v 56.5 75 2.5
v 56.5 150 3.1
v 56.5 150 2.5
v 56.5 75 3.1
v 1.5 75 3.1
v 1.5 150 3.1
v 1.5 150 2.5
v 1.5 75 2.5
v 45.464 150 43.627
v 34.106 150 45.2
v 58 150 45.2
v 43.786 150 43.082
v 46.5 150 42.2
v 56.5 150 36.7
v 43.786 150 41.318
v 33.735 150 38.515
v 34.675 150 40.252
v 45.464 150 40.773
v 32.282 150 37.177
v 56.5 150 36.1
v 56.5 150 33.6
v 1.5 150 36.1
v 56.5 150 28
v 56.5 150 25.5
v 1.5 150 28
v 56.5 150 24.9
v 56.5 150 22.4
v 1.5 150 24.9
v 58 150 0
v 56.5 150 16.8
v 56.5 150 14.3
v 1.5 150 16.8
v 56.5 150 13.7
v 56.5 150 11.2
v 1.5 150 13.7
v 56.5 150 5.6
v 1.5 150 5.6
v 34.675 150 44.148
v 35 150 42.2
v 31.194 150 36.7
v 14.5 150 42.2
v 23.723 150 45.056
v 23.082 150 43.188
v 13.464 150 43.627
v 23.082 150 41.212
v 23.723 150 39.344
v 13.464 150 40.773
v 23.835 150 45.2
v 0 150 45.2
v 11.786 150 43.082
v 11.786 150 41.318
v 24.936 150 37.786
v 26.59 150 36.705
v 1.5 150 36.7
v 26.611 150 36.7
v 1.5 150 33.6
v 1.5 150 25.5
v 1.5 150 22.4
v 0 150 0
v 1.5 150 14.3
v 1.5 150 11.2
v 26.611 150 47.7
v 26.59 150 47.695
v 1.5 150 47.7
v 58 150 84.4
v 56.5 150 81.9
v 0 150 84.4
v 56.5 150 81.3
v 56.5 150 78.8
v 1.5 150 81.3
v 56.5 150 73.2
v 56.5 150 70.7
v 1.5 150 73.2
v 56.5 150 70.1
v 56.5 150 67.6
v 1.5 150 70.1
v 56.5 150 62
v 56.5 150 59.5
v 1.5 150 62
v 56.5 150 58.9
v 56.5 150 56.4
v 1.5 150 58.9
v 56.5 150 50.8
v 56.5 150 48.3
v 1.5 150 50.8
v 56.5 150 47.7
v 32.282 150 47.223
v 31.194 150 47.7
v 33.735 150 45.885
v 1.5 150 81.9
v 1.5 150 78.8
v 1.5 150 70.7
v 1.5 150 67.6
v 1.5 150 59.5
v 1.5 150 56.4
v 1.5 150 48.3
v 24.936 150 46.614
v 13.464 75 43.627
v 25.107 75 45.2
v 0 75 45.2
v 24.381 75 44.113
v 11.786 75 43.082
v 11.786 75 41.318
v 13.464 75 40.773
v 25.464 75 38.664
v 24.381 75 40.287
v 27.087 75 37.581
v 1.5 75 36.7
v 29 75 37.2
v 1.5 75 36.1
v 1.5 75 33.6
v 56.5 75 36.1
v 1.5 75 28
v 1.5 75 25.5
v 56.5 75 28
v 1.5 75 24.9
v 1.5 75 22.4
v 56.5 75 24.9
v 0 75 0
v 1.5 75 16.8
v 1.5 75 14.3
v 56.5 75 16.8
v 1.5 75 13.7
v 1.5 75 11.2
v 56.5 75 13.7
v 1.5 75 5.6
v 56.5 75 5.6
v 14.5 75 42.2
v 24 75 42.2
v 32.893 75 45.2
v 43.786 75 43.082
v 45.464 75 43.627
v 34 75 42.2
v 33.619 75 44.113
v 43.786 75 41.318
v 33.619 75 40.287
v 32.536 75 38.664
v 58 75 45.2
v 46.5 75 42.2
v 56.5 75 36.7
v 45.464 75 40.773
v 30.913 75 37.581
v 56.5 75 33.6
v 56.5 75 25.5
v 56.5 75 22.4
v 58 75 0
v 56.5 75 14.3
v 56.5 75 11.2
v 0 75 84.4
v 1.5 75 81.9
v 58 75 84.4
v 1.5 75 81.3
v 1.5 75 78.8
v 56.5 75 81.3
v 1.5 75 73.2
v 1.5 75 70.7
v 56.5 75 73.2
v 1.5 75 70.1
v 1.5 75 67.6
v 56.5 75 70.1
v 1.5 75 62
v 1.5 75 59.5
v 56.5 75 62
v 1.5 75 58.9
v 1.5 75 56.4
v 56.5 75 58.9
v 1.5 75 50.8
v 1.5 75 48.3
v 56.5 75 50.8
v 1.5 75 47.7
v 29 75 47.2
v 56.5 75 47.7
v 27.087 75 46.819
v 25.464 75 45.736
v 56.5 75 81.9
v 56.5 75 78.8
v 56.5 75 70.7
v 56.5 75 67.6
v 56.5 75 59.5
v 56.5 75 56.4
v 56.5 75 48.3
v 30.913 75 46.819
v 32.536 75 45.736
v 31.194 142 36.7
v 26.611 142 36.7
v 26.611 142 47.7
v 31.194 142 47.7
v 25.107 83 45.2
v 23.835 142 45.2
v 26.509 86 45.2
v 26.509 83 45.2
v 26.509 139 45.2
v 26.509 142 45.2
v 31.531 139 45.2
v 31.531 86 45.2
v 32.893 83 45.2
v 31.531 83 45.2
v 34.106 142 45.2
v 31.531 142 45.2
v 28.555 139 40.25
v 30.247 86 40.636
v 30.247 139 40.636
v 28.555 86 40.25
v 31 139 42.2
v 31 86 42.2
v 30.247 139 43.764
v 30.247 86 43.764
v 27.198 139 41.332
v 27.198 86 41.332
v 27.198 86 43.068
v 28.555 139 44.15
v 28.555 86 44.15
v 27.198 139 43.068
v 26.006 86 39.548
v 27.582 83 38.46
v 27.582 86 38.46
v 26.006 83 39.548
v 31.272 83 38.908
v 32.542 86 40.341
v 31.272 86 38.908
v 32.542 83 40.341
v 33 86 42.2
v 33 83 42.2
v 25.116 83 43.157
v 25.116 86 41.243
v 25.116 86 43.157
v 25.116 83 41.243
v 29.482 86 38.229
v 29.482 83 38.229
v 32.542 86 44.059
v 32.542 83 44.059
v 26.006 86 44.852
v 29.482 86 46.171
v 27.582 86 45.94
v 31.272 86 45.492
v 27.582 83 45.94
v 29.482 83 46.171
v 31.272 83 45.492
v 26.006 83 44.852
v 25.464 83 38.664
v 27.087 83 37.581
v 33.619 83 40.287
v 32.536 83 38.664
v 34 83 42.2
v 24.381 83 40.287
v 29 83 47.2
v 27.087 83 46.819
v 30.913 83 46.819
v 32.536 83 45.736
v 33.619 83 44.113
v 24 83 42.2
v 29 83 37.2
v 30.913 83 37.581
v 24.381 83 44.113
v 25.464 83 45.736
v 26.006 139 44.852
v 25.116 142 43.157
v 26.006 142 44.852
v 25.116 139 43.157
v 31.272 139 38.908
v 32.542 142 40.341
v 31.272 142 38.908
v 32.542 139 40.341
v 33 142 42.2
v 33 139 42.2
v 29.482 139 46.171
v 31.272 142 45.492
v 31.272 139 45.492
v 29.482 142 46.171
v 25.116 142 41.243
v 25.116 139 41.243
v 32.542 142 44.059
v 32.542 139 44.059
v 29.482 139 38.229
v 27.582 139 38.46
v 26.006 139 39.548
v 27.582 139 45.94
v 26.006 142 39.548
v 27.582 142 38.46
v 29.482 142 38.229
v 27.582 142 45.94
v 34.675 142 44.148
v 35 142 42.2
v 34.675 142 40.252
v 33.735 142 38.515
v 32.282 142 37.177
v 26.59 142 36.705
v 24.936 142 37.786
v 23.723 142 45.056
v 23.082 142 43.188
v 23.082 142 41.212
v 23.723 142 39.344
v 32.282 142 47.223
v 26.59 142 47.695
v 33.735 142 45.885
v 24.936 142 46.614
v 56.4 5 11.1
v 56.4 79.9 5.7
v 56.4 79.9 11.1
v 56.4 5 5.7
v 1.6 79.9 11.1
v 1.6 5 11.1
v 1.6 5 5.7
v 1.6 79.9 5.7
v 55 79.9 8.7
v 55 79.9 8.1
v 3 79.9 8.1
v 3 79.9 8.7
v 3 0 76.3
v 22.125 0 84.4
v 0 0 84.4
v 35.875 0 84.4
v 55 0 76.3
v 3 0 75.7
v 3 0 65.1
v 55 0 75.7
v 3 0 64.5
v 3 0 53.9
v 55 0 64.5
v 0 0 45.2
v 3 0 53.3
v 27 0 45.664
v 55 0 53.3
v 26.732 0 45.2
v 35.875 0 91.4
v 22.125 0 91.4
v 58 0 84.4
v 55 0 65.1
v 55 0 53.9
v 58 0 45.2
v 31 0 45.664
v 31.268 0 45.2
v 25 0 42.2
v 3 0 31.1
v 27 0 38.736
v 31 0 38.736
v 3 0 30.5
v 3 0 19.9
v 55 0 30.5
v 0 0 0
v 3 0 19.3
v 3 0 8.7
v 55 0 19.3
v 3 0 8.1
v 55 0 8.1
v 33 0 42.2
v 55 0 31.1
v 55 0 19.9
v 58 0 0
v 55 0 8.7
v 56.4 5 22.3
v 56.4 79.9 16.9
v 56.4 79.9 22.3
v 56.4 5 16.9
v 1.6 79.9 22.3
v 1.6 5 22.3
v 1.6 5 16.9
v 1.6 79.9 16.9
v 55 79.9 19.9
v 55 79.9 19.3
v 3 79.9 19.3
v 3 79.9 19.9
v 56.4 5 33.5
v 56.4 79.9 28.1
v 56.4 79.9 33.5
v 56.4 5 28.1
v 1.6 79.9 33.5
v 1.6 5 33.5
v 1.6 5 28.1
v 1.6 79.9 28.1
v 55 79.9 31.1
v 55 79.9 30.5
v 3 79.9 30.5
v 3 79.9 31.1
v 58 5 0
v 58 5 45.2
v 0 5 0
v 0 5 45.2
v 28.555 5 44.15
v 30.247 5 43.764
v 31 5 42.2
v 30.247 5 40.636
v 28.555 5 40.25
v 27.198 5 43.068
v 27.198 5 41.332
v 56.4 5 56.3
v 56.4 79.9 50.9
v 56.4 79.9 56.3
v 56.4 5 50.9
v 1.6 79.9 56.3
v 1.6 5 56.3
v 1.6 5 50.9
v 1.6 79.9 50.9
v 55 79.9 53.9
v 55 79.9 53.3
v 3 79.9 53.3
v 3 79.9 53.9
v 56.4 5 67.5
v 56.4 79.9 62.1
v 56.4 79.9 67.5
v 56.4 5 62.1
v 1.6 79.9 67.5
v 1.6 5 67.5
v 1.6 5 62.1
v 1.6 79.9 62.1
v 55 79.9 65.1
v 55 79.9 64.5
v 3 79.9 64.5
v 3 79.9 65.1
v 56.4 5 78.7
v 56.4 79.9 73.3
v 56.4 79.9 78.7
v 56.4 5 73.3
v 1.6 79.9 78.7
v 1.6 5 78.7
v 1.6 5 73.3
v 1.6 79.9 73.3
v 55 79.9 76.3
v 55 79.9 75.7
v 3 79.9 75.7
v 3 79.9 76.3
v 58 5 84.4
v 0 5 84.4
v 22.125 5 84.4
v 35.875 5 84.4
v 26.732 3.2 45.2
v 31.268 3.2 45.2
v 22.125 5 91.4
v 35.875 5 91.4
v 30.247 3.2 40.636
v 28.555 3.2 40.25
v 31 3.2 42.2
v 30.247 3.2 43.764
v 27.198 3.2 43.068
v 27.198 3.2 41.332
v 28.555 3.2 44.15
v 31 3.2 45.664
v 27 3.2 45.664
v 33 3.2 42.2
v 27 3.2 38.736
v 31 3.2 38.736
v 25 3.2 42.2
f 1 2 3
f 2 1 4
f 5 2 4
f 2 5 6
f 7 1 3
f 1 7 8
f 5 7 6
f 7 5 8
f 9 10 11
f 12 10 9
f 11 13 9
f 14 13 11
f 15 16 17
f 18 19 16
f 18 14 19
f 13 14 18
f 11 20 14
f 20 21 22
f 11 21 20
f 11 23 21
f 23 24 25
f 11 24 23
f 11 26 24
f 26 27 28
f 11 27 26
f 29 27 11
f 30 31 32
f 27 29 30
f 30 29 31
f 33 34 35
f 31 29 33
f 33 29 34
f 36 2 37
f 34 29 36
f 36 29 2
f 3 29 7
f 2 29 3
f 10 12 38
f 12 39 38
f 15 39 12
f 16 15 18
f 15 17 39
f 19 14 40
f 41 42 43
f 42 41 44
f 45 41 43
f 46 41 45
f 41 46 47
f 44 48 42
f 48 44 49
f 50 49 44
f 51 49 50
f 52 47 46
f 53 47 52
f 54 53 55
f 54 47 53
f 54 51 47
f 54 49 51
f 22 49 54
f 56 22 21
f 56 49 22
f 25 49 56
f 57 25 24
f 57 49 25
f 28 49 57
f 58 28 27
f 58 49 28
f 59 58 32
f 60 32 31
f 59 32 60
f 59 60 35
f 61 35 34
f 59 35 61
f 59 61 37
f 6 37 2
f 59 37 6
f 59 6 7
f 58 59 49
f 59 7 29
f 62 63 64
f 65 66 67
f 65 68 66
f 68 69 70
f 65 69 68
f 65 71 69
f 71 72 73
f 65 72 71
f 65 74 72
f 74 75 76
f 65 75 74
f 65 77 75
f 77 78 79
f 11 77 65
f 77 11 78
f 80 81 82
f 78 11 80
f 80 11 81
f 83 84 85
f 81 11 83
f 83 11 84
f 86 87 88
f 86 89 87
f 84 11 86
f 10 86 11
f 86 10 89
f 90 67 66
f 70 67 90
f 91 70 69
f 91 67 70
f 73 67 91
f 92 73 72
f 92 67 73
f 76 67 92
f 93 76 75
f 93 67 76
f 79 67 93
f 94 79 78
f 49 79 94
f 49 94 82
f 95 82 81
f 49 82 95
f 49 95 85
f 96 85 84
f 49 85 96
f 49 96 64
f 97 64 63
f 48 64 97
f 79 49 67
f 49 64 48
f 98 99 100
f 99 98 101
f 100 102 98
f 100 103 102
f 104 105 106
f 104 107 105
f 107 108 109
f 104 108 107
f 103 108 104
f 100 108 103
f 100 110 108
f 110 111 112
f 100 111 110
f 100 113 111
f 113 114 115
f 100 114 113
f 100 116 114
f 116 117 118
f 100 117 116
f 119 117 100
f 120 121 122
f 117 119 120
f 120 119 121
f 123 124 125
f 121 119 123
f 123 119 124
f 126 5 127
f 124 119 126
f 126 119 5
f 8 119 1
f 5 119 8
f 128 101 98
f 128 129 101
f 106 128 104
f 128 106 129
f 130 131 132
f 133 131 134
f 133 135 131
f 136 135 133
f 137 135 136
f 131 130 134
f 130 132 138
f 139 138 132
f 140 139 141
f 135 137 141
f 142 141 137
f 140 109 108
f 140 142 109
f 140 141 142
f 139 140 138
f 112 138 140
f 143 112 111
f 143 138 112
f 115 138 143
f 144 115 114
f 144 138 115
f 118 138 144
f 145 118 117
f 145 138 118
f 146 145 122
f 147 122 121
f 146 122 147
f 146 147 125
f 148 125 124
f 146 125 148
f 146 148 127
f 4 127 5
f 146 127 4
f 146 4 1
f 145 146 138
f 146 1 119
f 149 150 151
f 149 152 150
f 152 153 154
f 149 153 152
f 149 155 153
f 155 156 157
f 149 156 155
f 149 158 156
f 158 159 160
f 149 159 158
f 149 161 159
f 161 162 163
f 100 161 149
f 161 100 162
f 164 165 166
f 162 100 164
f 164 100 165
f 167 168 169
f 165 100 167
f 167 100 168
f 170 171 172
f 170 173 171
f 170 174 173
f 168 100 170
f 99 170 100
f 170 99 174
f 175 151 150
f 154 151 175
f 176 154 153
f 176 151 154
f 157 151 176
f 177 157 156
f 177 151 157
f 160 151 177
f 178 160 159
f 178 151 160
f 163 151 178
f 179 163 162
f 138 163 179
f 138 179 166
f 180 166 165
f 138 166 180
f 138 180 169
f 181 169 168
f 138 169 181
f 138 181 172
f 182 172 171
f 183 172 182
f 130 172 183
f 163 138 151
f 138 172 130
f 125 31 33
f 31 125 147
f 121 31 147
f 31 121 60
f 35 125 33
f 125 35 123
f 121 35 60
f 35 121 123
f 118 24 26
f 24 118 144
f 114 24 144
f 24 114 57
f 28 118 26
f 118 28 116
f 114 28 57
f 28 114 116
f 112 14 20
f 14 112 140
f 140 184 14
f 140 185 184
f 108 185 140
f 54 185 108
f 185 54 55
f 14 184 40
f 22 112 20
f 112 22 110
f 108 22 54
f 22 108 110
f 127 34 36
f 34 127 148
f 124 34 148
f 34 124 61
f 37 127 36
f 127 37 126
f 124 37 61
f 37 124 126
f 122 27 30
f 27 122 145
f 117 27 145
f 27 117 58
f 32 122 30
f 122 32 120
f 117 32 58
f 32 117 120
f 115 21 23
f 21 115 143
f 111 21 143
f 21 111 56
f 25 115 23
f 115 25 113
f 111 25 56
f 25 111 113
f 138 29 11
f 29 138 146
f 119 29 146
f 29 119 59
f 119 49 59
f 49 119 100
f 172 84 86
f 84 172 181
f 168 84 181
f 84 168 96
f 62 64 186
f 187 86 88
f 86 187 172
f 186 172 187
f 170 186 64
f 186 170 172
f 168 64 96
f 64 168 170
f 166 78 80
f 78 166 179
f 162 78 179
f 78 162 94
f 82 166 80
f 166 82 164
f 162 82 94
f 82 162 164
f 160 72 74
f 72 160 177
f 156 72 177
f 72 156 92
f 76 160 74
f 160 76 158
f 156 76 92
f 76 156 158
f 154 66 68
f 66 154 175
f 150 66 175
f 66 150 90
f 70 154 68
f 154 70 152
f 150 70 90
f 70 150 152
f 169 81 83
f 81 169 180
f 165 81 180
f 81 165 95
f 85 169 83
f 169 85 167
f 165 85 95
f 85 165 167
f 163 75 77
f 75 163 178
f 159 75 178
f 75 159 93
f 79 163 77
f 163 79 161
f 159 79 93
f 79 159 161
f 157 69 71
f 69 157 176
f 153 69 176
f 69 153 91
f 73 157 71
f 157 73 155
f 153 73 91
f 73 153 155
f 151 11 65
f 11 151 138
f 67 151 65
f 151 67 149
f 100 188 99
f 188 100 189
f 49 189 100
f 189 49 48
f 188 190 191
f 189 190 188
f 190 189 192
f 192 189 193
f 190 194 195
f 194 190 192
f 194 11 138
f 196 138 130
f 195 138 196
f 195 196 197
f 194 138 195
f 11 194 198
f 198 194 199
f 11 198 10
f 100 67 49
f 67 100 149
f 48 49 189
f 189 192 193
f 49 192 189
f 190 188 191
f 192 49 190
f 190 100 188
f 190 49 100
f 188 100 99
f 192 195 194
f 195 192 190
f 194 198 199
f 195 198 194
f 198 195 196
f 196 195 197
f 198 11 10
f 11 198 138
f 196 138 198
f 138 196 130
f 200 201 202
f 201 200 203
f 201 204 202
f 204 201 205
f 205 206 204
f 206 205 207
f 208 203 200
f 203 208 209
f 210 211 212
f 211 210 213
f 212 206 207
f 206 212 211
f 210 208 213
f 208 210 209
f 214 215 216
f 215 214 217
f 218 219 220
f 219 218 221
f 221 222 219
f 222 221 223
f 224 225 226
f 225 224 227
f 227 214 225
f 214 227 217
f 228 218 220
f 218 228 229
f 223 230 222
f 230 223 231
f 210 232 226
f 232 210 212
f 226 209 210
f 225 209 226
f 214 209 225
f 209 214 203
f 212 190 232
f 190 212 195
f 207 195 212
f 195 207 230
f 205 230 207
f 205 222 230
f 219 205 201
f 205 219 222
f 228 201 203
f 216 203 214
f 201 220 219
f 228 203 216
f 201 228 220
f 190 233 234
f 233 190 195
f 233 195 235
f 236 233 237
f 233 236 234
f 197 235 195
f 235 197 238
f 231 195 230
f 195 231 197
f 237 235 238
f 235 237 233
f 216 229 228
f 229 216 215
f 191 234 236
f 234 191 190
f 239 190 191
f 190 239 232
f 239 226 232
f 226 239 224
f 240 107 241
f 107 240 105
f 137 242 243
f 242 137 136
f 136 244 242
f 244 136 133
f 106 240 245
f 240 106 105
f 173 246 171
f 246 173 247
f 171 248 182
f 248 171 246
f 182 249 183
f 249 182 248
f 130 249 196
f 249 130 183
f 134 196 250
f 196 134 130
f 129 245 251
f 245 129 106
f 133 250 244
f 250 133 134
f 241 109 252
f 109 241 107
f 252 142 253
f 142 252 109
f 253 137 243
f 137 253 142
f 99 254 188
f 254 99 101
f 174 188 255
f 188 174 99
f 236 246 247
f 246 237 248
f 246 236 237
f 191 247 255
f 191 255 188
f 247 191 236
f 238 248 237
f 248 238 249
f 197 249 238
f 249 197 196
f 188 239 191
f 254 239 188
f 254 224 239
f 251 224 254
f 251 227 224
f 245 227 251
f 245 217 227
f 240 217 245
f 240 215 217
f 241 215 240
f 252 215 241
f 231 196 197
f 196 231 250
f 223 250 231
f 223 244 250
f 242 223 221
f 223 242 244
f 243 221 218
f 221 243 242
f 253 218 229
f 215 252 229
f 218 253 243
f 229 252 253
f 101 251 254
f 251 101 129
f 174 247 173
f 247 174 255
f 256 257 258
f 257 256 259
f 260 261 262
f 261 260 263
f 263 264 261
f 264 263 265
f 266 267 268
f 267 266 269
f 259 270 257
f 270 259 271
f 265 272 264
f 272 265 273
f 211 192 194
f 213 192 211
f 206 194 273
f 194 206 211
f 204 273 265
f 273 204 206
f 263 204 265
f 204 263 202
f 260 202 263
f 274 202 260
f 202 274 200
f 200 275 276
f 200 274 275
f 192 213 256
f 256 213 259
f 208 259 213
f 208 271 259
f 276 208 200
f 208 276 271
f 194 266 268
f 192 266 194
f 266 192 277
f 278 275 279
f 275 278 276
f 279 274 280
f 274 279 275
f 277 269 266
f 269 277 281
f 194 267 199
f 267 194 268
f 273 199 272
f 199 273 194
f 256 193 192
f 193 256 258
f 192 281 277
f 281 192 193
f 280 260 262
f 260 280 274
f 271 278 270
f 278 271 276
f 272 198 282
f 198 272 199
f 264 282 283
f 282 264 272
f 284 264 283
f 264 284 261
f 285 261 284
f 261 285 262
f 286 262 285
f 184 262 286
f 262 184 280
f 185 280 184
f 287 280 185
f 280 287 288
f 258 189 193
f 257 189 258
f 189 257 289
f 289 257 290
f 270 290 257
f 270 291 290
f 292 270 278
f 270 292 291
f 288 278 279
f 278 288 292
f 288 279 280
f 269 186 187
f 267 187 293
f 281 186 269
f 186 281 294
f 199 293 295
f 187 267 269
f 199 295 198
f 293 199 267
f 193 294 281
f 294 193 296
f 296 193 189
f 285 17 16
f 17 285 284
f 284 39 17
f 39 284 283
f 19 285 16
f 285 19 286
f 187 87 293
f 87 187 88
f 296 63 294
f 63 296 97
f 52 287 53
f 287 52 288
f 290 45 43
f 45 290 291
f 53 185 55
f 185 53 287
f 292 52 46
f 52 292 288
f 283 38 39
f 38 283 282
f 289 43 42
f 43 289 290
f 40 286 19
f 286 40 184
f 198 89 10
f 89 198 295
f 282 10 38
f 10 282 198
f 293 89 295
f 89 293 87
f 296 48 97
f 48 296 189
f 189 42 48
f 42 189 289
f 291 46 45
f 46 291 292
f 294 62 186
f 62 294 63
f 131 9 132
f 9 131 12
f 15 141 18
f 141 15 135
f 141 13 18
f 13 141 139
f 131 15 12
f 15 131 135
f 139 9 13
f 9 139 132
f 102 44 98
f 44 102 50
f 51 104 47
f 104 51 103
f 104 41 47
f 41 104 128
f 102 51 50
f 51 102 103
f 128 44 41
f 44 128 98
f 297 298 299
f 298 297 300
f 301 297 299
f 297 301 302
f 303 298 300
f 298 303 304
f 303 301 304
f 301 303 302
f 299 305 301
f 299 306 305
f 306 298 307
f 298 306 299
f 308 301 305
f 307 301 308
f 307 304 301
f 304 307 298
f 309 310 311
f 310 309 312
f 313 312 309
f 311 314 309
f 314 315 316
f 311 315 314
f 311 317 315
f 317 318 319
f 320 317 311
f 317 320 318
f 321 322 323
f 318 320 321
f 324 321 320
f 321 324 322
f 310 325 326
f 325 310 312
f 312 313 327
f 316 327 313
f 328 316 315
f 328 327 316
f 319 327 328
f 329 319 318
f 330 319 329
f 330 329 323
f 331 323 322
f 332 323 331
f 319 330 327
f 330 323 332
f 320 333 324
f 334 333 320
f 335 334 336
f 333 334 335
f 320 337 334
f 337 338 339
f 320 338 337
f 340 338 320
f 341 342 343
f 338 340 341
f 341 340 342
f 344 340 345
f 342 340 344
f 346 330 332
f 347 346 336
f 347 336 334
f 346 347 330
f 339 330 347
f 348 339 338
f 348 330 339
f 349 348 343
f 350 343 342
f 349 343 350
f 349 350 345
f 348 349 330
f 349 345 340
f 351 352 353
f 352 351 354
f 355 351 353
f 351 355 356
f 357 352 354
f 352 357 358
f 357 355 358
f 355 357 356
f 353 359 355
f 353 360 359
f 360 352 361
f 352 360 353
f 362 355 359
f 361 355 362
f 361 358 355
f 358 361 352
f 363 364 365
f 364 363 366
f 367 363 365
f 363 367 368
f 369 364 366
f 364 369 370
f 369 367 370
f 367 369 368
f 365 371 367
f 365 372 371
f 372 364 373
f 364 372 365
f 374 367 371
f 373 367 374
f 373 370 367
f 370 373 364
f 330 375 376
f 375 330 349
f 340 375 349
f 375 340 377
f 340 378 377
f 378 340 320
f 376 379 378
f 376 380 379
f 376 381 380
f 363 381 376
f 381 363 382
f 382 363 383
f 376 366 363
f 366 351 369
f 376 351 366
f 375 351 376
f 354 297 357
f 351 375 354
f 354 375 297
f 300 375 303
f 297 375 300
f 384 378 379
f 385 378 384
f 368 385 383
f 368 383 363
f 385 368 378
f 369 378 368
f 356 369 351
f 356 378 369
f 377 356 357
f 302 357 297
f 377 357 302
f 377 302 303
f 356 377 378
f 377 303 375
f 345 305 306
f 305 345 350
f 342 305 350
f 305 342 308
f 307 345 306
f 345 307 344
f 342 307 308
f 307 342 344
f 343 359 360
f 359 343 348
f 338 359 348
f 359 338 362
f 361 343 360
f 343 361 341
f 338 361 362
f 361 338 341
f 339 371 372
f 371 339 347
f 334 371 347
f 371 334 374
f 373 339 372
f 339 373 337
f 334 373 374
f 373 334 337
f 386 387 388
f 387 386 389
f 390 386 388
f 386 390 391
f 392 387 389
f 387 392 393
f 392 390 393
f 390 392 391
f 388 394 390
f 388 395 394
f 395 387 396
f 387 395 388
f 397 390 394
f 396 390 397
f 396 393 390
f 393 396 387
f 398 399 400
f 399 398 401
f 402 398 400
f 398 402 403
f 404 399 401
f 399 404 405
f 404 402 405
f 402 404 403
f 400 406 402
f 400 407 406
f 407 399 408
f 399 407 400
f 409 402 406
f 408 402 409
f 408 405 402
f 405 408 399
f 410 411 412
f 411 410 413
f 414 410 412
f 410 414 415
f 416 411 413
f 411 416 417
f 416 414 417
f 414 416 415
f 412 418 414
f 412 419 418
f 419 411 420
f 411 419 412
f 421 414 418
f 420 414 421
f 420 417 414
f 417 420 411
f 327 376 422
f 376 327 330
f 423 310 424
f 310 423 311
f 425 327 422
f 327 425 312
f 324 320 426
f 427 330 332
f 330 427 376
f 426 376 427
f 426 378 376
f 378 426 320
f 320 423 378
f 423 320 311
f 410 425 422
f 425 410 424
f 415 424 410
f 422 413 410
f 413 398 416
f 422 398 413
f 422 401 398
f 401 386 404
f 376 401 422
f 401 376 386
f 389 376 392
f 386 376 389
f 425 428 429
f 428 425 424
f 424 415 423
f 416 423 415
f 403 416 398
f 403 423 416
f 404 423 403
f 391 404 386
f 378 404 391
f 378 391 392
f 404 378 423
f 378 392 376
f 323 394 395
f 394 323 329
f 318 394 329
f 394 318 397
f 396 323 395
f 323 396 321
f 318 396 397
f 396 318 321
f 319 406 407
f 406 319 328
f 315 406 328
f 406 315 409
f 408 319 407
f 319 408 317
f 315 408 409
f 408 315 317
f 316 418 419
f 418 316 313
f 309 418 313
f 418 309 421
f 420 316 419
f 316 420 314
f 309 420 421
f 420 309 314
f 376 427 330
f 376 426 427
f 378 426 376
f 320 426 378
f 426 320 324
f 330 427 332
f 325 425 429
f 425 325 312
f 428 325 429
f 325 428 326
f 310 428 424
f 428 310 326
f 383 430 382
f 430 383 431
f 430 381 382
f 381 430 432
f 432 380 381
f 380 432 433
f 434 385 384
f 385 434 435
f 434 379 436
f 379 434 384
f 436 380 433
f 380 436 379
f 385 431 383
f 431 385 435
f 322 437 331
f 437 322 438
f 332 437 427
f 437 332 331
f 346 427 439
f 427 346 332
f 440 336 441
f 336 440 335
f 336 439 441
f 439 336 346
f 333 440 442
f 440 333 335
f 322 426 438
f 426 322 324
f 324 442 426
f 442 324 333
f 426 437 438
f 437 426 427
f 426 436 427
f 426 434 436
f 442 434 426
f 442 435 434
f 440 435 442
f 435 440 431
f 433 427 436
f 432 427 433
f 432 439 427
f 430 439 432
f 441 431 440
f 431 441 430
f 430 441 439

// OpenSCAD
/* [Main Parameters] */

// count of all plates in capacitor
plate_count_ = 13;           // [3, 5, 7, 9, 11, 13, 15, 17, 19, 21, 23, 25]

// distance between rotor and stator capacitor plates in mm
plate_distance_ = 5;         // [1, 2, 3, 4, 5, 6, 7, 8]

// capacitor plate width
plate_width_ = 55;

// capacitor plate height
plate_depth_ = 75;

// capacitor plate hole height, use larger value to make some room
plate_height_ = 0.6;

// gap between rotor and stator, tune for smoother sliding by printing tiny capacitor first, use acetone bath!
sliding_gap_ = 0.1;

// capacitor element to generate
generate_element_ = "stator";       // [stator, rotor]

// generate both stator and rotor for demo purposes?
generate_both_demo_ = "yes";        // [yes, no]

// enable worm gear system?
enable_worm_gear_ = "yes";          // [yes, no]

// enable button pusher?
enable_rotor_button_pusher_ = "yes";    // [yes, no]

/* [Worm Gear Parameters] */

// how much space to provide for worm gear system
worm_gear_gap_ = 6;

// worm shaft radius, change if use other than M4 shaft
worm_shaft_radius_ = 2;     // [1, 1.5, 2, 2.5, 3]

// bearing outer radius
bearing_radius_ = 4;

// bearing size depth/height
bearing_depth_ = 3;

// hole for screws, use larger diameter so tool will fit
screw_hole_radius_ = 6;

// depth of hole for screw, change based on shaft, number of nuts
screw_hole_depth_ = 8;

// hole sizes for stepper holder screws
holder_screw_radius_ = 1.5;

// distance from the shaft to the the motor holding screws
holder_screw_center_distance_ = 16;

// height of rotor button pusher    
button_pusher_height_ = 7;

// hole depth for holding nut on the rotor, change based on shaft, M3/M4/etc
nut_cutout_depth_ = 3.2;

// holding nut radius on the rotor, change based on shaft, M3/M4/etc
nut_cutout_radius_ = 4;
    
/* [Advanced Parameters] */

// gap between plate edge and stator edge
plate_width_guard_ = 1.5;

// depth of rotor base plate
rotor_base_plate_depth_ = 5;

assert(plate_count_ % 2 == 1, "Plate count must be an odd number");

echo("maximum capacitance: ~", capacitor_value_pf(plate_width_, plate_depth_, plate_count_, plate_distance_), "pF");
echo("breakdown voltage for air: ", breakdown_voltage_kv(3, plate_distance_), "kV");
echo("breakdown voltage for PETG: ", breakdown_voltage_kv(4.5, plate_distance_), "kV");

if (enable_worm_gear_ == "yes")
{
    assert(plate_count_ % 4 == 1, "Wrong plate count, must be one of [5, 9, 13, 17, 21, 25]");
    capacitor_with_worm_gear(plate_count_, plate_distance_, plate_width_, 
        plate_depth_, plate_height_, sliding_gap_, generate_element_, 
        generate_both_demo_, worm_gear_gap_, enable_rotor_button_pusher_);
} else 
{
    capacitor_naked(plate_count_, plate_distance_, plate_width_, 
        plate_depth_, plate_height_, sliding_gap_, generate_element_, generate_both_demo_);
}

// calculate capacitor breakdown voltage
function breakdown_voltage_kv(breakdown_voltage_mm, plate_distance) = plate_distance * breakdown_voltage_mm;

// calculate ~20% infill PETG filament approximate capacitor value from dimensions in mm and plate count
function capacitor_value_pf(plate_width, plate_depth, plate_count, plate_distance) =
    let (dielectric_constant = 1.55, electrostatic_constant = 8.854e-12)
        (plate_count - 1) * dielectric_constant * electrostatic_constant * plate_width * plate_depth / plate_distance * 1e9;

// generate capacitor with worm gear
module capacitor_with_worm_gear(plate_count, plate_distance, plate_width, 
    plate_depth, plate_height, sliding_gap, generate_element, generate_both_demo, 
    worm_gear_gap, enable_rotor_button_pusher)
{
    if (generate_element == "stator" || generate_both_demo == "yes") 
    {
        translate([0, 75, 0])
            capacitor_stator_with_worm_gear(plate_count, plate_distance, 
                plate_width, plate_depth, plate_height, worm_gear_gap);
    }
    if (generate_element == "rotor" || generate_both_demo == "yes") 
    {
        color("green")
            capacitor_rotor_with_worm_gear(plate_count, plate_distance, 
                plate_width, plate_depth, plate_height, sliding_gap, worm_gear_gap, enable_rotor_button_pusher);
    }
}

// generate capacitor
module capacitor_naked(plate_count, plate_distance, plate_width, 
    plate_depth, plate_height, sliding_gap, generate_element, generate_both_demo)
{
    if (generate_element == "stator" || generate_both_demo == "yes") 
    {
        translate([0, 50, 0])
            capacitor_stator(plate_count, plate_distance, 
                plate_width, plate_depth, plate_height);
    }
    if (generate_element == "rotor" || generate_both_demo == "yes") 
    {
        color("green")
            capacitor_rotor(plate_count, plate_distance, 
                plate_width, plate_depth, plate_height, sliding_gap);
    }
}

// generate stator with worm gear support
module capacitor_stator_with_worm_gear(plate_count, plate_distance, 
    plate_width, plate_depth, plate_height, worm_gear_gap)
{
    plate_width_guard = plate_width_guard_;
    worm_shaft_radius = worm_shaft_radius_;
    bearing_radius = bearing_radius_;
    bearing_depth = bearing_depth_;
    screw_hole_radius = screw_hole_radius_;
    screw_hole_depth = screw_hole_depth_;
    holder_screw_radius = holder_screw_radius_;
    holder_screw_center_distance = holder_screw_center_distance_;
    
    holder_screw_depth = plate_depth;
    bearing_full_depth = bearing_depth + screw_hole_depth;
    half_plate_count = ceil(plate_count / 2.0);
    box_height = half_plate_count * (plate_distance + plate_height);
    box_height_center = box_height + worm_gear_gap / 2.0;
    box_width_center = plate_width / 2.0 + plate_width_guard;
    
    difference()
    {
        // stator body with holes
        union()
        {
            // two split capacitor stators
            translate([0, 0, 0])
                capacitor_stator(half_plate_count, plate_distance, plate_width, plate_depth, plate_height);
            translate([0, 0, box_height + worm_gear_gap])
                capacitor_stator(half_plate_count, plate_distance, plate_width, plate_depth, plate_height);
            
            // worm gear blade hole
            translate([0, 0, box_height])
                cube([plate_width + 2 * plate_width_guard, plate_depth, worm_gear_gap]);
        }
        
        // worm gear system
        translate([plate_width / 2.0 + plate_width_guard, 0, box_height_center])
            rotate([-90, 0, 0])
                union() 
                {
                    cylinder(plate_depth, r=worm_shaft_radius);
                    cylinder(bearing_full_depth, r=bearing_radius);
                    cylinder(screw_hole_depth, r=bearing_radius + 1);
                }
        translate([box_width_center, plate_depth - bearing_full_depth, box_height_center])
            rotate([-90, 0, 0])
                cylinder(bearing_full_depth, r=bearing_radius);
        translate([box_width_center, plate_depth - screw_hole_depth, box_height_center])
            rotate([-90, 0, 0])
                cylinder(screw_hole_depth, r=screw_hole_radius);

        // holder holes
        translate([box_width_center + holder_screw_center_distance, plate_depth - holder_screw_depth, box_height_center])
            rotate([-90, 0, 0])
                cylinder(holder_screw_depth, r=holder_screw_radius);
        translate([box_width_center - holder_screw_center_distance, plate_depth - holder_screw_depth, box_height_center])
            rotate([-90, 0, 0])
                cylinder(holder_screw_depth, r=holder_screw_radius);
    }
}

// generate rotor with worm gear support
module capacitor_rotor_with_worm_gear(plate_count, plate_distance, 
    plate_width, plate_depth, plate_height, sliding_gap, 
    worm_gear_gap, enable_rotor_button_pusher)
{
    plate_width_guard = plate_width_guard_;
    worm_shaft_radius = worm_shaft_radius_;
    base_plate_width = rotor_base_plate_depth_;
    nut_cutout_depth = nut_cutout_depth_;
    nut_cutout_radius = nut_cutout_radius_;
    button_pusher_height = button_pusher_height_;

    half_plate_count = ceil(plate_count / 2.0);
    
    box_height = half_plate_count * (plate_distance + plate_height);
    box_height_center = box_height + worm_gear_gap / 2.0;
    box_width_center = plate_width / 2.0 + plate_width_guard;
    
    button_pusher_height_pos = 2 * box_height + worm_gear_gap;
    button_pusher_width = plate_width / 4.0;
    button_pusher_width_center = box_width_center - button_pusher_width / 2.0;
    button_pusher_depth = base_plate_width;

    difference()
    {
        // rotor body with blades
        union()
        {
            // two split capacitor rotors
            translate([0, 0, 0])
                capacitor_rotor(half_plate_count, plate_distance, plate_width, 
                    plate_depth, plate_height, sliding_gap);
            translate([0, 0, box_height + worm_gear_gap])
                capacitor_rotor(half_plate_count, plate_distance, plate_width, 
                    plate_depth, plate_height, sliding_gap);
            
            // worm gear blade
            translate([0, 0, box_height])
                cube([plate_width + 2 * plate_width_guard, base_plate_width, worm_gear_gap]);

            if (enable_rotor_button_pusher == "yes") 
            {
                translate([button_pusher_width_center, 0, button_pusher_height_pos])
                    cube([button_pusher_width, button_pusher_depth, button_pusher_height]);
            }
        }

        // worm gear hole
        translate([box_width_center, 0, box_height_center])
            rotate([-90, 0, 0])
                cylinder(base_plate_width, r=worm_shaft_radius);

        // nut cutout
        translate([box_width_center, 0, box_height_center])
            rotate([-90, 0, 0])
                cylinder(r=nut_cutout_radius, h=nut_cutout_depth, $fn=6);
    }
}

// generate sliding capacitor stator
module capacitor_stator(plate_count, plate_distance, plate_width, plate_depth, plate_height) 
{
    plate_width_guard = plate_width_guard_;

    // calculated dimensions
    box_width = plate_width + (plate_width_guard * 2);
    box_depth = plate_depth;
    box_height = plate_count * plate_distance + plate_count * plate_height;

    echo("stator dimensions:", box_width, box_depth, box_height);

    stator_plate_count = ceil(plate_count / 2.0);
    stator_plate_distance = 2 * (plate_distance + plate_height);
    stator_plate_initial_height = plate_distance / 2.0;

    echo("stator plates:", stator_plate_distance, stator_plate_initial_height);

    stator_hole_count = floor(plate_count / 2.0);
    stator_hole_distance = stator_plate_distance;
    stator_hole_initial_height = plate_distance + plate_height;
    stator_hole_height = plate_distance + plate_height;

    echo("stator holes:", stator_hole_distance, stator_hole_initial_height);

    difference() 
    {
        // stator body
        cube([box_width, box_depth, box_height]);

        // holes for plates
        for (plate_num = [0:stator_plate_count - 1]) 
        {
            translate([plate_width_guard, 0, plate_num * stator_plate_distance + stator_plate_initial_height])
                cube([plate_width, plate_depth, plate_height]);
        }
        
        // holes for rotor blades
        for (plate_num = [0:stator_hole_count - 1]) 
        {
            translate([plate_width_guard, 0, plate_num * stator_hole_distance + stator_hole_initial_height])
                cube([plate_width, plate_depth, stator_hole_height]);
        }
    }
}

// generate sliding capacitor rotor
module capacitor_rotor(plate_count, plate_distance, plate_width, plate_depth, plate_height, sliding_gap) 
{
    plate_width_guard = plate_width_guard_;

    // calculated dimensions
    box_width = plate_width + (plate_width_guard * 2);
    box_depth = rotor_base_plate_depth_;
    box_height = plate_count * plate_distance + plate_count * plate_height;

    echo("rotor dimensions:", box_width, box_depth, box_height);

    rotor_plate_count = ceil(plate_count / 2.0);
    rotor_plate_distance = 2 * (plate_distance + plate_height);
    rotor_plate_initial_height = plate_distance + plate_height + plate_distance / 2.0;

    echo("rotor plates:", rotor_plate_distance, rotor_plate_initial_height);

    rotor_blade_count = floor(plate_count / 2.0);
    rotor_blade_distance = rotor_plate_distance;
    rotor_blade_initial_height = plate_distance + plate_height + sliding_gap;
    rotor_blade_height = plate_distance + plate_height - 2 * sliding_gap;

    echo("rotor blades:", rotor_blade_distance, rotor_blade_initial_height);

    difference() 
    {
        // rotor body
        union() 
        {
            // rotor base plate
            cube([box_width, box_depth, box_height]);
            
            // rotor blades
            for (plate_num = [0:rotor_blade_count - 1]) 
            {
                translate([plate_width_guard + sliding_gap, 0, plate_num * rotor_blade_distance + rotor_blade_initial_height])
                    cube([plate_width - 2 * sliding_gap, plate_depth + box_depth - sliding_gap, rotor_blade_height]);
            }
        }
        
        // rotor plates 
        for (plate_num = [0:rotor_plate_count - 1]) 
        {
            translate([2 * plate_width_guard, 0, plate_num * rotor_plate_distance + rotor_plate_initial_height])
                cube([plate_width - 2 * plate_width_guard, plate_depth + box_depth, plate_height]);
        }
    }
}
